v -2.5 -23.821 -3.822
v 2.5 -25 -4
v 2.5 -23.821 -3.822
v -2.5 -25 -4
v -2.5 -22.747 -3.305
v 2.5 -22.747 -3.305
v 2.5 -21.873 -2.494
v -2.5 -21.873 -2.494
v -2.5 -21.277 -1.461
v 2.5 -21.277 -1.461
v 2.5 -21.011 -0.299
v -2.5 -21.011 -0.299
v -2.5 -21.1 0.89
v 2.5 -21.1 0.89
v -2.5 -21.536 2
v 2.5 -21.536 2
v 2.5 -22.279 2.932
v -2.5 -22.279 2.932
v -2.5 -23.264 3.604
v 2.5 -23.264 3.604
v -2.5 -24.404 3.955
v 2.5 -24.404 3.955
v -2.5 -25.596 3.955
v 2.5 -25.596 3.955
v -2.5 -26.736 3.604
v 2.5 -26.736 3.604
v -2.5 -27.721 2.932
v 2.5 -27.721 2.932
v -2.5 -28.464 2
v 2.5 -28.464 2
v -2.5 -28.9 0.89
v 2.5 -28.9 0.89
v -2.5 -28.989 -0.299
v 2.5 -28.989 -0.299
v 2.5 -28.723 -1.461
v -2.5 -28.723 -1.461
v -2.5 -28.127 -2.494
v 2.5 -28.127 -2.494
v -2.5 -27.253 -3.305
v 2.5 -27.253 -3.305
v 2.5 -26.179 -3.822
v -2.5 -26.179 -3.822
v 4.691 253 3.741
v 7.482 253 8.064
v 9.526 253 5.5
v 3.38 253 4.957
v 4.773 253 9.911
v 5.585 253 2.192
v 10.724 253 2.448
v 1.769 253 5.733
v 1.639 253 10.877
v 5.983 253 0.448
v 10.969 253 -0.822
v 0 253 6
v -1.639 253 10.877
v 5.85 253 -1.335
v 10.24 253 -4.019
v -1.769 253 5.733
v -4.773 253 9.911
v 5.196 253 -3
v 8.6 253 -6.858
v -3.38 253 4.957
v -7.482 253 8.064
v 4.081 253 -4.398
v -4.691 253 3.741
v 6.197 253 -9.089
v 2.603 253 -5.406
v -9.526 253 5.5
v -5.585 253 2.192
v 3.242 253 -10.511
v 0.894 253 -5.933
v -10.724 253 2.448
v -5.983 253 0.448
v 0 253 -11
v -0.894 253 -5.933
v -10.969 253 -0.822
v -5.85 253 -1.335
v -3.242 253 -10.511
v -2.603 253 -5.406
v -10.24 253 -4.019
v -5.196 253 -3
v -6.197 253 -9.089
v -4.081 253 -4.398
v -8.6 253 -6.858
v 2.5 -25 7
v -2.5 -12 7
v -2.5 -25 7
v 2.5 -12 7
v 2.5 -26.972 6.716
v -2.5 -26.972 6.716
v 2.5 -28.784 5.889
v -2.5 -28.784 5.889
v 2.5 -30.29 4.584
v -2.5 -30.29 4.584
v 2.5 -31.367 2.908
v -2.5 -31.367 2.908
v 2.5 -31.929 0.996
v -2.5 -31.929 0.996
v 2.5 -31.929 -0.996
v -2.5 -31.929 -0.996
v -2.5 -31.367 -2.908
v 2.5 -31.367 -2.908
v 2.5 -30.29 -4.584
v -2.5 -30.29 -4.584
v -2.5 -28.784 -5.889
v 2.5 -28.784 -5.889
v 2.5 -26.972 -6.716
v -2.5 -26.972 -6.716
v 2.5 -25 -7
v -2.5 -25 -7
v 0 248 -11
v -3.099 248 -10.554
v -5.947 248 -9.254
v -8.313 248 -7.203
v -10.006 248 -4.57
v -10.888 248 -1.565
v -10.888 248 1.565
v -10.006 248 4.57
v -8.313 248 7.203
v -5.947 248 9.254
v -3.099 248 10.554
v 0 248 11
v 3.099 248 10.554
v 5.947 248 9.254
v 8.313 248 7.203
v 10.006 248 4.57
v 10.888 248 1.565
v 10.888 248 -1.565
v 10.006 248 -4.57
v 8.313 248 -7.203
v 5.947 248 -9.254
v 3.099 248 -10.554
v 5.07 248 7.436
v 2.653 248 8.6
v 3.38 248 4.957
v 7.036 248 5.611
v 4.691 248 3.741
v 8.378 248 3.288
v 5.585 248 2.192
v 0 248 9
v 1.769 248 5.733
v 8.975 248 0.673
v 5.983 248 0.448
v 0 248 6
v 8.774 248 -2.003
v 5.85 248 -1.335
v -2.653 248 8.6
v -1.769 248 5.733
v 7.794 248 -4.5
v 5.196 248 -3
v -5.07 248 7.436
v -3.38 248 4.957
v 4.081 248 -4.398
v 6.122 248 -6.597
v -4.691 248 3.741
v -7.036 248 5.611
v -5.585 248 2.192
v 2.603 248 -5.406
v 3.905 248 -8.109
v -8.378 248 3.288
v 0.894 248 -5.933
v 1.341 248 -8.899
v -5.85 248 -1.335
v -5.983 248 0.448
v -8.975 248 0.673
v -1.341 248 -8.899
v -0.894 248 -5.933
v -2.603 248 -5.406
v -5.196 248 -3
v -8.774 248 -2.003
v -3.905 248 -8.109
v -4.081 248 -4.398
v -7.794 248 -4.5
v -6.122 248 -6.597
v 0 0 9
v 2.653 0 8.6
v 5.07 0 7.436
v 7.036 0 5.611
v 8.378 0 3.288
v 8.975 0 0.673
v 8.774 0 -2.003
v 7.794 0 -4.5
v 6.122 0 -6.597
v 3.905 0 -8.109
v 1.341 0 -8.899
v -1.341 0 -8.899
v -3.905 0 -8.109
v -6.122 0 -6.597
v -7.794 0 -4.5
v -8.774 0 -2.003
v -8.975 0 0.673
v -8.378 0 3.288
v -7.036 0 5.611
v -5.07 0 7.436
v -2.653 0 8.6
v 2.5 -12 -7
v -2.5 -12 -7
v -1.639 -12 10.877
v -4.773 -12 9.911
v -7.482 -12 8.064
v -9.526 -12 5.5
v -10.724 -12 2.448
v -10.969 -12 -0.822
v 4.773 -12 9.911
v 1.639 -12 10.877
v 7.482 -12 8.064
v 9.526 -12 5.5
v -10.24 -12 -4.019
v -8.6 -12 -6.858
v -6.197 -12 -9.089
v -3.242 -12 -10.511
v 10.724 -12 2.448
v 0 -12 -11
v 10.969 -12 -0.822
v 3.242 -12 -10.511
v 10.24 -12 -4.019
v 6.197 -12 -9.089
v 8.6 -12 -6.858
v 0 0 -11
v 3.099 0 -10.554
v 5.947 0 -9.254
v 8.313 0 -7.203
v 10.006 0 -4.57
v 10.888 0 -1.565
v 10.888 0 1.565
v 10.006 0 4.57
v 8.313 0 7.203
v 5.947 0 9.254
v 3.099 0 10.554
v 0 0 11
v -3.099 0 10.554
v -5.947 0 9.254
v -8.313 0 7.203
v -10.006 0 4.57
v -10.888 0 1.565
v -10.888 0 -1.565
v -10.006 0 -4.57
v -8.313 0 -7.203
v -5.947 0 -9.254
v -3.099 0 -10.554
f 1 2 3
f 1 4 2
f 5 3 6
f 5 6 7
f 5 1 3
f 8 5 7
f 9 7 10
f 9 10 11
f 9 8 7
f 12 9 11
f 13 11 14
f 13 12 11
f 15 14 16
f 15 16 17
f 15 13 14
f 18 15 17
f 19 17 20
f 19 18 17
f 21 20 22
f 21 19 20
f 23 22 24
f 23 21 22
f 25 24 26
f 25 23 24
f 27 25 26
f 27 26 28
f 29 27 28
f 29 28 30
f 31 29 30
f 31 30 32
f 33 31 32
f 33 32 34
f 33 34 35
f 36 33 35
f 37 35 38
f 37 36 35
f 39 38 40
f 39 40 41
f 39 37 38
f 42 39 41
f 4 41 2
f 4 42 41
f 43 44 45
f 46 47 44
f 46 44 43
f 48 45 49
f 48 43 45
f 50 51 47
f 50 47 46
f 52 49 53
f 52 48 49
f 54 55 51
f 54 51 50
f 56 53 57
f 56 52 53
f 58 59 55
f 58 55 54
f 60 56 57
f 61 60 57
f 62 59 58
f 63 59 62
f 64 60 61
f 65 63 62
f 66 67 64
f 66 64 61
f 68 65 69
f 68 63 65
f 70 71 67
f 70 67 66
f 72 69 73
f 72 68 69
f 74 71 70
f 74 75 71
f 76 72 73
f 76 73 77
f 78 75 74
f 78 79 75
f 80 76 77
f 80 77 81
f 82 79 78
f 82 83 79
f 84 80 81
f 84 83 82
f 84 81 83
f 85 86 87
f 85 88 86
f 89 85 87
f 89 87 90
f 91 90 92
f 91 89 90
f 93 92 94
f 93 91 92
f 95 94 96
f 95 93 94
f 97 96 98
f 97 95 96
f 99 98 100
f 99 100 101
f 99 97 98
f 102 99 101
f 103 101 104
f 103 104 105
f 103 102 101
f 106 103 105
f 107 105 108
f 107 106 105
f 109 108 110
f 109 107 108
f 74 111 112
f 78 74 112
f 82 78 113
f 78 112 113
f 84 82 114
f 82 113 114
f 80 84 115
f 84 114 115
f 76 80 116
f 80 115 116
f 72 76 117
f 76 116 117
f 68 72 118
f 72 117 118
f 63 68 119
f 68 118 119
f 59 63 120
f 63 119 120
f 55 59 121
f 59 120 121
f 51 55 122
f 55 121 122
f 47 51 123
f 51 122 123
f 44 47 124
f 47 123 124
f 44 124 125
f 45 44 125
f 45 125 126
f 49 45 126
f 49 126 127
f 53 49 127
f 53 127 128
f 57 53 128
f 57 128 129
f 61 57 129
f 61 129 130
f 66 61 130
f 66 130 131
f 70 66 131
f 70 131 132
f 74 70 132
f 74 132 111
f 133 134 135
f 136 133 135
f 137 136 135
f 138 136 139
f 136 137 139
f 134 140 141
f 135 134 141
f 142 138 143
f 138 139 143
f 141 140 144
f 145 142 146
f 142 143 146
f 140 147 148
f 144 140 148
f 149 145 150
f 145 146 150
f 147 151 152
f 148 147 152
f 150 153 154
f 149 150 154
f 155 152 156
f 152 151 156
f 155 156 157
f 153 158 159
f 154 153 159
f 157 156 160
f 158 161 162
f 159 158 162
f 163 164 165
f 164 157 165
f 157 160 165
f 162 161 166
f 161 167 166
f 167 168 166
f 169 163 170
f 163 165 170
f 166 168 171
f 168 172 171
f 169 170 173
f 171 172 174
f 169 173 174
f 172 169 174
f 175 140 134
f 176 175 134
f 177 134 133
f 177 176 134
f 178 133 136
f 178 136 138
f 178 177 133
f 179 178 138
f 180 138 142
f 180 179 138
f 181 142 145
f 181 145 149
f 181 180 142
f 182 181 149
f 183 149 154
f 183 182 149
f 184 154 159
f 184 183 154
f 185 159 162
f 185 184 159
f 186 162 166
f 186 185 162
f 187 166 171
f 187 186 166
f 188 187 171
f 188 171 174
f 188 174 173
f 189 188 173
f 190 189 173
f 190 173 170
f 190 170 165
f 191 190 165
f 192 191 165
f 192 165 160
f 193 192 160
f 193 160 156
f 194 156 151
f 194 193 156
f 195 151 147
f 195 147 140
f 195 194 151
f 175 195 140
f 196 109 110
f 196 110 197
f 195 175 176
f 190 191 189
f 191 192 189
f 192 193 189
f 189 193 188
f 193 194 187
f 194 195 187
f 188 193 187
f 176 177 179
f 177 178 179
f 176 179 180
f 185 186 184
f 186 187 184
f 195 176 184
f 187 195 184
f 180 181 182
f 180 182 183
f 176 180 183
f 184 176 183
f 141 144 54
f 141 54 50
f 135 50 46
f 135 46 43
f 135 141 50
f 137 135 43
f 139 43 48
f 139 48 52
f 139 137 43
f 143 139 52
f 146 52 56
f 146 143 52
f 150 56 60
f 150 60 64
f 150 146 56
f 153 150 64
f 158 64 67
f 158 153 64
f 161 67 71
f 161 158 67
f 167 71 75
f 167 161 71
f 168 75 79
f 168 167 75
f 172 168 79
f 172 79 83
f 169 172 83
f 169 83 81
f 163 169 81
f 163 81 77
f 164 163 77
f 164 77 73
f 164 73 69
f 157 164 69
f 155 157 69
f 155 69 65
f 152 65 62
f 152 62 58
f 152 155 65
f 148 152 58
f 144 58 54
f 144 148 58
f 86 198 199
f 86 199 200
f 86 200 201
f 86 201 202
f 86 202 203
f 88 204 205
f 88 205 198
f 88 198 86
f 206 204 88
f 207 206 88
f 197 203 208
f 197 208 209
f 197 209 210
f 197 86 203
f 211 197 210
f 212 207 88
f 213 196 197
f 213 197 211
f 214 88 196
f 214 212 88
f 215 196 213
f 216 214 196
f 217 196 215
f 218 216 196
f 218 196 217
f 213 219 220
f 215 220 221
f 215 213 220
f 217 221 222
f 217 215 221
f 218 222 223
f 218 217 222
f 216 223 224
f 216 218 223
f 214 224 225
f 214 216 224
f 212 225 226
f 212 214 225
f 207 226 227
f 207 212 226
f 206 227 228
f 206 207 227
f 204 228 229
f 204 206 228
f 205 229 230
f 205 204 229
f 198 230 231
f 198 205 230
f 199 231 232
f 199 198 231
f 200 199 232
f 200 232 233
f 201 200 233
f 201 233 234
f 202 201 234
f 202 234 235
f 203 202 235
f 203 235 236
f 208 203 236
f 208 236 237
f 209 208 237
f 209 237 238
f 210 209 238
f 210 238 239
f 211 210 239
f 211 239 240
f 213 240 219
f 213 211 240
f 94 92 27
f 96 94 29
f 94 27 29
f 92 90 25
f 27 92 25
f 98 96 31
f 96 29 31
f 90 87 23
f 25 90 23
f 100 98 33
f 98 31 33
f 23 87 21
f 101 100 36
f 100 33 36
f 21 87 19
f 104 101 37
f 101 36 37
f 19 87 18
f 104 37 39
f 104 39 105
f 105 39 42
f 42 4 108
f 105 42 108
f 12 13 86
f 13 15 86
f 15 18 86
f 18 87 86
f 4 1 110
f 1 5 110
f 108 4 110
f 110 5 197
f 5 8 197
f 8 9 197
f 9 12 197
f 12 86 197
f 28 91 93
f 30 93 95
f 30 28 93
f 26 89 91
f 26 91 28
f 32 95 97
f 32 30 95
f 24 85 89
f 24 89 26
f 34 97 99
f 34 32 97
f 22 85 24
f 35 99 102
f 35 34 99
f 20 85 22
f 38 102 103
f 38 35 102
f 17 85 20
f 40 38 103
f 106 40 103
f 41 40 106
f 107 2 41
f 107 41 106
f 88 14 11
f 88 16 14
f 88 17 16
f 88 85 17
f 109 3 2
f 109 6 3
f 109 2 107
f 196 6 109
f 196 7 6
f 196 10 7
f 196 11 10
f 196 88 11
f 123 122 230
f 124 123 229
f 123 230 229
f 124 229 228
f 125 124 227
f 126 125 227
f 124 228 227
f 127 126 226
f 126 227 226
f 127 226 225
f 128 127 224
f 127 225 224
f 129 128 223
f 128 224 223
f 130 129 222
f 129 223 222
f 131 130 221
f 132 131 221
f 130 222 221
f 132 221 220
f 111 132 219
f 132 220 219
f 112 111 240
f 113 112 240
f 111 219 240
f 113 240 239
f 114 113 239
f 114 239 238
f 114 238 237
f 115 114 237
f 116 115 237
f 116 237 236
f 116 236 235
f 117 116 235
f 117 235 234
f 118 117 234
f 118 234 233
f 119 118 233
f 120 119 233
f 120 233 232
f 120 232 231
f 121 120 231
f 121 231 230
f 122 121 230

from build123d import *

# Parameters (mm, degrees)
SKETCH_1_R      = 11
SKETCH_1_R_2    = 9
EXTRUDE_1_DEPTH = 248
EXTRUDE_START   = 12
SKETCH_2_R      = 11
EXTRUDE_2_DEPTH = 12
SKETCH_4_R      = 4
EXTRUDE_4_DEPTH = 2.5
SKETCH_5_R      = 11
SKETCH_5_R_2    = 6
EXTRUDE_5_DEPTH = 5


with BuildPart() as part:
    # 草圖1 → 填料-伸長1 (new body)
    with BuildSketch(Plane(origin=(0, 0, 0), x_dir=(1, 0, 0), z_dir=(0, 1, 0))):
        with Locations(Location((0, 0, 0), (0, 0, 270))):
            Circle(SKETCH_1_R)
        with Locations(Location((0, 0, 0), (0, 0, 270))):
            Circle(SKETCH_1_R_2, mode=Mode.SUBTRACT)
    extrude(amount=EXTRUDE_1_DEPTH)

    # 草圖2 → 填料-伸長2 (add)
    with BuildSketch(Plane.XZ.offset(EXTRUDE_START)):
        with Locations(Location((0, 0, 0), (0, 0, 270))):
            Circle(SKETCH_2_R)
    extrude(amount=-EXTRUDE_2_DEPTH)

    # 草圖4 → 填料-伸長4 (add, symmetric)
    with BuildSketch(Plane(origin=(0, 0, 0), x_dir=(0, 0, -1), z_dir=(1, 0, 0))):
        with BuildLine():
            Line((-7, -12), (-7, -25))
            ThreePointArc((-7, -25), (0, -32), (7, -25))
            Line((7, -25), (7, -12))
            Line((7, -12), (-7, -12))
        make_face()
        with Locations((0, -25)):
            Circle(SKETCH_4_R, mode=Mode.SUBTRACT)
    extrude(amount=EXTRUDE_4_DEPTH, both=True)

    # 草圖5 → 填料-伸長5 (add)
    with BuildSketch(Plane(origin=(0, 248, 0), x_dir=(1, 0, 0), z_dir=(0, 1, 0))):
        with Locations(Location((0, 0, 0), (0, 0, 90))):
            Circle(SKETCH_5_R)
        with Locations(Location((0, 0, 0), (0, 0, 270))):
            Circle(SKETCH_5_R_2, mode=Mode.SUBTRACT)
    extrude(amount=EXTRUDE_5_DEPTH)


solid = part.part
